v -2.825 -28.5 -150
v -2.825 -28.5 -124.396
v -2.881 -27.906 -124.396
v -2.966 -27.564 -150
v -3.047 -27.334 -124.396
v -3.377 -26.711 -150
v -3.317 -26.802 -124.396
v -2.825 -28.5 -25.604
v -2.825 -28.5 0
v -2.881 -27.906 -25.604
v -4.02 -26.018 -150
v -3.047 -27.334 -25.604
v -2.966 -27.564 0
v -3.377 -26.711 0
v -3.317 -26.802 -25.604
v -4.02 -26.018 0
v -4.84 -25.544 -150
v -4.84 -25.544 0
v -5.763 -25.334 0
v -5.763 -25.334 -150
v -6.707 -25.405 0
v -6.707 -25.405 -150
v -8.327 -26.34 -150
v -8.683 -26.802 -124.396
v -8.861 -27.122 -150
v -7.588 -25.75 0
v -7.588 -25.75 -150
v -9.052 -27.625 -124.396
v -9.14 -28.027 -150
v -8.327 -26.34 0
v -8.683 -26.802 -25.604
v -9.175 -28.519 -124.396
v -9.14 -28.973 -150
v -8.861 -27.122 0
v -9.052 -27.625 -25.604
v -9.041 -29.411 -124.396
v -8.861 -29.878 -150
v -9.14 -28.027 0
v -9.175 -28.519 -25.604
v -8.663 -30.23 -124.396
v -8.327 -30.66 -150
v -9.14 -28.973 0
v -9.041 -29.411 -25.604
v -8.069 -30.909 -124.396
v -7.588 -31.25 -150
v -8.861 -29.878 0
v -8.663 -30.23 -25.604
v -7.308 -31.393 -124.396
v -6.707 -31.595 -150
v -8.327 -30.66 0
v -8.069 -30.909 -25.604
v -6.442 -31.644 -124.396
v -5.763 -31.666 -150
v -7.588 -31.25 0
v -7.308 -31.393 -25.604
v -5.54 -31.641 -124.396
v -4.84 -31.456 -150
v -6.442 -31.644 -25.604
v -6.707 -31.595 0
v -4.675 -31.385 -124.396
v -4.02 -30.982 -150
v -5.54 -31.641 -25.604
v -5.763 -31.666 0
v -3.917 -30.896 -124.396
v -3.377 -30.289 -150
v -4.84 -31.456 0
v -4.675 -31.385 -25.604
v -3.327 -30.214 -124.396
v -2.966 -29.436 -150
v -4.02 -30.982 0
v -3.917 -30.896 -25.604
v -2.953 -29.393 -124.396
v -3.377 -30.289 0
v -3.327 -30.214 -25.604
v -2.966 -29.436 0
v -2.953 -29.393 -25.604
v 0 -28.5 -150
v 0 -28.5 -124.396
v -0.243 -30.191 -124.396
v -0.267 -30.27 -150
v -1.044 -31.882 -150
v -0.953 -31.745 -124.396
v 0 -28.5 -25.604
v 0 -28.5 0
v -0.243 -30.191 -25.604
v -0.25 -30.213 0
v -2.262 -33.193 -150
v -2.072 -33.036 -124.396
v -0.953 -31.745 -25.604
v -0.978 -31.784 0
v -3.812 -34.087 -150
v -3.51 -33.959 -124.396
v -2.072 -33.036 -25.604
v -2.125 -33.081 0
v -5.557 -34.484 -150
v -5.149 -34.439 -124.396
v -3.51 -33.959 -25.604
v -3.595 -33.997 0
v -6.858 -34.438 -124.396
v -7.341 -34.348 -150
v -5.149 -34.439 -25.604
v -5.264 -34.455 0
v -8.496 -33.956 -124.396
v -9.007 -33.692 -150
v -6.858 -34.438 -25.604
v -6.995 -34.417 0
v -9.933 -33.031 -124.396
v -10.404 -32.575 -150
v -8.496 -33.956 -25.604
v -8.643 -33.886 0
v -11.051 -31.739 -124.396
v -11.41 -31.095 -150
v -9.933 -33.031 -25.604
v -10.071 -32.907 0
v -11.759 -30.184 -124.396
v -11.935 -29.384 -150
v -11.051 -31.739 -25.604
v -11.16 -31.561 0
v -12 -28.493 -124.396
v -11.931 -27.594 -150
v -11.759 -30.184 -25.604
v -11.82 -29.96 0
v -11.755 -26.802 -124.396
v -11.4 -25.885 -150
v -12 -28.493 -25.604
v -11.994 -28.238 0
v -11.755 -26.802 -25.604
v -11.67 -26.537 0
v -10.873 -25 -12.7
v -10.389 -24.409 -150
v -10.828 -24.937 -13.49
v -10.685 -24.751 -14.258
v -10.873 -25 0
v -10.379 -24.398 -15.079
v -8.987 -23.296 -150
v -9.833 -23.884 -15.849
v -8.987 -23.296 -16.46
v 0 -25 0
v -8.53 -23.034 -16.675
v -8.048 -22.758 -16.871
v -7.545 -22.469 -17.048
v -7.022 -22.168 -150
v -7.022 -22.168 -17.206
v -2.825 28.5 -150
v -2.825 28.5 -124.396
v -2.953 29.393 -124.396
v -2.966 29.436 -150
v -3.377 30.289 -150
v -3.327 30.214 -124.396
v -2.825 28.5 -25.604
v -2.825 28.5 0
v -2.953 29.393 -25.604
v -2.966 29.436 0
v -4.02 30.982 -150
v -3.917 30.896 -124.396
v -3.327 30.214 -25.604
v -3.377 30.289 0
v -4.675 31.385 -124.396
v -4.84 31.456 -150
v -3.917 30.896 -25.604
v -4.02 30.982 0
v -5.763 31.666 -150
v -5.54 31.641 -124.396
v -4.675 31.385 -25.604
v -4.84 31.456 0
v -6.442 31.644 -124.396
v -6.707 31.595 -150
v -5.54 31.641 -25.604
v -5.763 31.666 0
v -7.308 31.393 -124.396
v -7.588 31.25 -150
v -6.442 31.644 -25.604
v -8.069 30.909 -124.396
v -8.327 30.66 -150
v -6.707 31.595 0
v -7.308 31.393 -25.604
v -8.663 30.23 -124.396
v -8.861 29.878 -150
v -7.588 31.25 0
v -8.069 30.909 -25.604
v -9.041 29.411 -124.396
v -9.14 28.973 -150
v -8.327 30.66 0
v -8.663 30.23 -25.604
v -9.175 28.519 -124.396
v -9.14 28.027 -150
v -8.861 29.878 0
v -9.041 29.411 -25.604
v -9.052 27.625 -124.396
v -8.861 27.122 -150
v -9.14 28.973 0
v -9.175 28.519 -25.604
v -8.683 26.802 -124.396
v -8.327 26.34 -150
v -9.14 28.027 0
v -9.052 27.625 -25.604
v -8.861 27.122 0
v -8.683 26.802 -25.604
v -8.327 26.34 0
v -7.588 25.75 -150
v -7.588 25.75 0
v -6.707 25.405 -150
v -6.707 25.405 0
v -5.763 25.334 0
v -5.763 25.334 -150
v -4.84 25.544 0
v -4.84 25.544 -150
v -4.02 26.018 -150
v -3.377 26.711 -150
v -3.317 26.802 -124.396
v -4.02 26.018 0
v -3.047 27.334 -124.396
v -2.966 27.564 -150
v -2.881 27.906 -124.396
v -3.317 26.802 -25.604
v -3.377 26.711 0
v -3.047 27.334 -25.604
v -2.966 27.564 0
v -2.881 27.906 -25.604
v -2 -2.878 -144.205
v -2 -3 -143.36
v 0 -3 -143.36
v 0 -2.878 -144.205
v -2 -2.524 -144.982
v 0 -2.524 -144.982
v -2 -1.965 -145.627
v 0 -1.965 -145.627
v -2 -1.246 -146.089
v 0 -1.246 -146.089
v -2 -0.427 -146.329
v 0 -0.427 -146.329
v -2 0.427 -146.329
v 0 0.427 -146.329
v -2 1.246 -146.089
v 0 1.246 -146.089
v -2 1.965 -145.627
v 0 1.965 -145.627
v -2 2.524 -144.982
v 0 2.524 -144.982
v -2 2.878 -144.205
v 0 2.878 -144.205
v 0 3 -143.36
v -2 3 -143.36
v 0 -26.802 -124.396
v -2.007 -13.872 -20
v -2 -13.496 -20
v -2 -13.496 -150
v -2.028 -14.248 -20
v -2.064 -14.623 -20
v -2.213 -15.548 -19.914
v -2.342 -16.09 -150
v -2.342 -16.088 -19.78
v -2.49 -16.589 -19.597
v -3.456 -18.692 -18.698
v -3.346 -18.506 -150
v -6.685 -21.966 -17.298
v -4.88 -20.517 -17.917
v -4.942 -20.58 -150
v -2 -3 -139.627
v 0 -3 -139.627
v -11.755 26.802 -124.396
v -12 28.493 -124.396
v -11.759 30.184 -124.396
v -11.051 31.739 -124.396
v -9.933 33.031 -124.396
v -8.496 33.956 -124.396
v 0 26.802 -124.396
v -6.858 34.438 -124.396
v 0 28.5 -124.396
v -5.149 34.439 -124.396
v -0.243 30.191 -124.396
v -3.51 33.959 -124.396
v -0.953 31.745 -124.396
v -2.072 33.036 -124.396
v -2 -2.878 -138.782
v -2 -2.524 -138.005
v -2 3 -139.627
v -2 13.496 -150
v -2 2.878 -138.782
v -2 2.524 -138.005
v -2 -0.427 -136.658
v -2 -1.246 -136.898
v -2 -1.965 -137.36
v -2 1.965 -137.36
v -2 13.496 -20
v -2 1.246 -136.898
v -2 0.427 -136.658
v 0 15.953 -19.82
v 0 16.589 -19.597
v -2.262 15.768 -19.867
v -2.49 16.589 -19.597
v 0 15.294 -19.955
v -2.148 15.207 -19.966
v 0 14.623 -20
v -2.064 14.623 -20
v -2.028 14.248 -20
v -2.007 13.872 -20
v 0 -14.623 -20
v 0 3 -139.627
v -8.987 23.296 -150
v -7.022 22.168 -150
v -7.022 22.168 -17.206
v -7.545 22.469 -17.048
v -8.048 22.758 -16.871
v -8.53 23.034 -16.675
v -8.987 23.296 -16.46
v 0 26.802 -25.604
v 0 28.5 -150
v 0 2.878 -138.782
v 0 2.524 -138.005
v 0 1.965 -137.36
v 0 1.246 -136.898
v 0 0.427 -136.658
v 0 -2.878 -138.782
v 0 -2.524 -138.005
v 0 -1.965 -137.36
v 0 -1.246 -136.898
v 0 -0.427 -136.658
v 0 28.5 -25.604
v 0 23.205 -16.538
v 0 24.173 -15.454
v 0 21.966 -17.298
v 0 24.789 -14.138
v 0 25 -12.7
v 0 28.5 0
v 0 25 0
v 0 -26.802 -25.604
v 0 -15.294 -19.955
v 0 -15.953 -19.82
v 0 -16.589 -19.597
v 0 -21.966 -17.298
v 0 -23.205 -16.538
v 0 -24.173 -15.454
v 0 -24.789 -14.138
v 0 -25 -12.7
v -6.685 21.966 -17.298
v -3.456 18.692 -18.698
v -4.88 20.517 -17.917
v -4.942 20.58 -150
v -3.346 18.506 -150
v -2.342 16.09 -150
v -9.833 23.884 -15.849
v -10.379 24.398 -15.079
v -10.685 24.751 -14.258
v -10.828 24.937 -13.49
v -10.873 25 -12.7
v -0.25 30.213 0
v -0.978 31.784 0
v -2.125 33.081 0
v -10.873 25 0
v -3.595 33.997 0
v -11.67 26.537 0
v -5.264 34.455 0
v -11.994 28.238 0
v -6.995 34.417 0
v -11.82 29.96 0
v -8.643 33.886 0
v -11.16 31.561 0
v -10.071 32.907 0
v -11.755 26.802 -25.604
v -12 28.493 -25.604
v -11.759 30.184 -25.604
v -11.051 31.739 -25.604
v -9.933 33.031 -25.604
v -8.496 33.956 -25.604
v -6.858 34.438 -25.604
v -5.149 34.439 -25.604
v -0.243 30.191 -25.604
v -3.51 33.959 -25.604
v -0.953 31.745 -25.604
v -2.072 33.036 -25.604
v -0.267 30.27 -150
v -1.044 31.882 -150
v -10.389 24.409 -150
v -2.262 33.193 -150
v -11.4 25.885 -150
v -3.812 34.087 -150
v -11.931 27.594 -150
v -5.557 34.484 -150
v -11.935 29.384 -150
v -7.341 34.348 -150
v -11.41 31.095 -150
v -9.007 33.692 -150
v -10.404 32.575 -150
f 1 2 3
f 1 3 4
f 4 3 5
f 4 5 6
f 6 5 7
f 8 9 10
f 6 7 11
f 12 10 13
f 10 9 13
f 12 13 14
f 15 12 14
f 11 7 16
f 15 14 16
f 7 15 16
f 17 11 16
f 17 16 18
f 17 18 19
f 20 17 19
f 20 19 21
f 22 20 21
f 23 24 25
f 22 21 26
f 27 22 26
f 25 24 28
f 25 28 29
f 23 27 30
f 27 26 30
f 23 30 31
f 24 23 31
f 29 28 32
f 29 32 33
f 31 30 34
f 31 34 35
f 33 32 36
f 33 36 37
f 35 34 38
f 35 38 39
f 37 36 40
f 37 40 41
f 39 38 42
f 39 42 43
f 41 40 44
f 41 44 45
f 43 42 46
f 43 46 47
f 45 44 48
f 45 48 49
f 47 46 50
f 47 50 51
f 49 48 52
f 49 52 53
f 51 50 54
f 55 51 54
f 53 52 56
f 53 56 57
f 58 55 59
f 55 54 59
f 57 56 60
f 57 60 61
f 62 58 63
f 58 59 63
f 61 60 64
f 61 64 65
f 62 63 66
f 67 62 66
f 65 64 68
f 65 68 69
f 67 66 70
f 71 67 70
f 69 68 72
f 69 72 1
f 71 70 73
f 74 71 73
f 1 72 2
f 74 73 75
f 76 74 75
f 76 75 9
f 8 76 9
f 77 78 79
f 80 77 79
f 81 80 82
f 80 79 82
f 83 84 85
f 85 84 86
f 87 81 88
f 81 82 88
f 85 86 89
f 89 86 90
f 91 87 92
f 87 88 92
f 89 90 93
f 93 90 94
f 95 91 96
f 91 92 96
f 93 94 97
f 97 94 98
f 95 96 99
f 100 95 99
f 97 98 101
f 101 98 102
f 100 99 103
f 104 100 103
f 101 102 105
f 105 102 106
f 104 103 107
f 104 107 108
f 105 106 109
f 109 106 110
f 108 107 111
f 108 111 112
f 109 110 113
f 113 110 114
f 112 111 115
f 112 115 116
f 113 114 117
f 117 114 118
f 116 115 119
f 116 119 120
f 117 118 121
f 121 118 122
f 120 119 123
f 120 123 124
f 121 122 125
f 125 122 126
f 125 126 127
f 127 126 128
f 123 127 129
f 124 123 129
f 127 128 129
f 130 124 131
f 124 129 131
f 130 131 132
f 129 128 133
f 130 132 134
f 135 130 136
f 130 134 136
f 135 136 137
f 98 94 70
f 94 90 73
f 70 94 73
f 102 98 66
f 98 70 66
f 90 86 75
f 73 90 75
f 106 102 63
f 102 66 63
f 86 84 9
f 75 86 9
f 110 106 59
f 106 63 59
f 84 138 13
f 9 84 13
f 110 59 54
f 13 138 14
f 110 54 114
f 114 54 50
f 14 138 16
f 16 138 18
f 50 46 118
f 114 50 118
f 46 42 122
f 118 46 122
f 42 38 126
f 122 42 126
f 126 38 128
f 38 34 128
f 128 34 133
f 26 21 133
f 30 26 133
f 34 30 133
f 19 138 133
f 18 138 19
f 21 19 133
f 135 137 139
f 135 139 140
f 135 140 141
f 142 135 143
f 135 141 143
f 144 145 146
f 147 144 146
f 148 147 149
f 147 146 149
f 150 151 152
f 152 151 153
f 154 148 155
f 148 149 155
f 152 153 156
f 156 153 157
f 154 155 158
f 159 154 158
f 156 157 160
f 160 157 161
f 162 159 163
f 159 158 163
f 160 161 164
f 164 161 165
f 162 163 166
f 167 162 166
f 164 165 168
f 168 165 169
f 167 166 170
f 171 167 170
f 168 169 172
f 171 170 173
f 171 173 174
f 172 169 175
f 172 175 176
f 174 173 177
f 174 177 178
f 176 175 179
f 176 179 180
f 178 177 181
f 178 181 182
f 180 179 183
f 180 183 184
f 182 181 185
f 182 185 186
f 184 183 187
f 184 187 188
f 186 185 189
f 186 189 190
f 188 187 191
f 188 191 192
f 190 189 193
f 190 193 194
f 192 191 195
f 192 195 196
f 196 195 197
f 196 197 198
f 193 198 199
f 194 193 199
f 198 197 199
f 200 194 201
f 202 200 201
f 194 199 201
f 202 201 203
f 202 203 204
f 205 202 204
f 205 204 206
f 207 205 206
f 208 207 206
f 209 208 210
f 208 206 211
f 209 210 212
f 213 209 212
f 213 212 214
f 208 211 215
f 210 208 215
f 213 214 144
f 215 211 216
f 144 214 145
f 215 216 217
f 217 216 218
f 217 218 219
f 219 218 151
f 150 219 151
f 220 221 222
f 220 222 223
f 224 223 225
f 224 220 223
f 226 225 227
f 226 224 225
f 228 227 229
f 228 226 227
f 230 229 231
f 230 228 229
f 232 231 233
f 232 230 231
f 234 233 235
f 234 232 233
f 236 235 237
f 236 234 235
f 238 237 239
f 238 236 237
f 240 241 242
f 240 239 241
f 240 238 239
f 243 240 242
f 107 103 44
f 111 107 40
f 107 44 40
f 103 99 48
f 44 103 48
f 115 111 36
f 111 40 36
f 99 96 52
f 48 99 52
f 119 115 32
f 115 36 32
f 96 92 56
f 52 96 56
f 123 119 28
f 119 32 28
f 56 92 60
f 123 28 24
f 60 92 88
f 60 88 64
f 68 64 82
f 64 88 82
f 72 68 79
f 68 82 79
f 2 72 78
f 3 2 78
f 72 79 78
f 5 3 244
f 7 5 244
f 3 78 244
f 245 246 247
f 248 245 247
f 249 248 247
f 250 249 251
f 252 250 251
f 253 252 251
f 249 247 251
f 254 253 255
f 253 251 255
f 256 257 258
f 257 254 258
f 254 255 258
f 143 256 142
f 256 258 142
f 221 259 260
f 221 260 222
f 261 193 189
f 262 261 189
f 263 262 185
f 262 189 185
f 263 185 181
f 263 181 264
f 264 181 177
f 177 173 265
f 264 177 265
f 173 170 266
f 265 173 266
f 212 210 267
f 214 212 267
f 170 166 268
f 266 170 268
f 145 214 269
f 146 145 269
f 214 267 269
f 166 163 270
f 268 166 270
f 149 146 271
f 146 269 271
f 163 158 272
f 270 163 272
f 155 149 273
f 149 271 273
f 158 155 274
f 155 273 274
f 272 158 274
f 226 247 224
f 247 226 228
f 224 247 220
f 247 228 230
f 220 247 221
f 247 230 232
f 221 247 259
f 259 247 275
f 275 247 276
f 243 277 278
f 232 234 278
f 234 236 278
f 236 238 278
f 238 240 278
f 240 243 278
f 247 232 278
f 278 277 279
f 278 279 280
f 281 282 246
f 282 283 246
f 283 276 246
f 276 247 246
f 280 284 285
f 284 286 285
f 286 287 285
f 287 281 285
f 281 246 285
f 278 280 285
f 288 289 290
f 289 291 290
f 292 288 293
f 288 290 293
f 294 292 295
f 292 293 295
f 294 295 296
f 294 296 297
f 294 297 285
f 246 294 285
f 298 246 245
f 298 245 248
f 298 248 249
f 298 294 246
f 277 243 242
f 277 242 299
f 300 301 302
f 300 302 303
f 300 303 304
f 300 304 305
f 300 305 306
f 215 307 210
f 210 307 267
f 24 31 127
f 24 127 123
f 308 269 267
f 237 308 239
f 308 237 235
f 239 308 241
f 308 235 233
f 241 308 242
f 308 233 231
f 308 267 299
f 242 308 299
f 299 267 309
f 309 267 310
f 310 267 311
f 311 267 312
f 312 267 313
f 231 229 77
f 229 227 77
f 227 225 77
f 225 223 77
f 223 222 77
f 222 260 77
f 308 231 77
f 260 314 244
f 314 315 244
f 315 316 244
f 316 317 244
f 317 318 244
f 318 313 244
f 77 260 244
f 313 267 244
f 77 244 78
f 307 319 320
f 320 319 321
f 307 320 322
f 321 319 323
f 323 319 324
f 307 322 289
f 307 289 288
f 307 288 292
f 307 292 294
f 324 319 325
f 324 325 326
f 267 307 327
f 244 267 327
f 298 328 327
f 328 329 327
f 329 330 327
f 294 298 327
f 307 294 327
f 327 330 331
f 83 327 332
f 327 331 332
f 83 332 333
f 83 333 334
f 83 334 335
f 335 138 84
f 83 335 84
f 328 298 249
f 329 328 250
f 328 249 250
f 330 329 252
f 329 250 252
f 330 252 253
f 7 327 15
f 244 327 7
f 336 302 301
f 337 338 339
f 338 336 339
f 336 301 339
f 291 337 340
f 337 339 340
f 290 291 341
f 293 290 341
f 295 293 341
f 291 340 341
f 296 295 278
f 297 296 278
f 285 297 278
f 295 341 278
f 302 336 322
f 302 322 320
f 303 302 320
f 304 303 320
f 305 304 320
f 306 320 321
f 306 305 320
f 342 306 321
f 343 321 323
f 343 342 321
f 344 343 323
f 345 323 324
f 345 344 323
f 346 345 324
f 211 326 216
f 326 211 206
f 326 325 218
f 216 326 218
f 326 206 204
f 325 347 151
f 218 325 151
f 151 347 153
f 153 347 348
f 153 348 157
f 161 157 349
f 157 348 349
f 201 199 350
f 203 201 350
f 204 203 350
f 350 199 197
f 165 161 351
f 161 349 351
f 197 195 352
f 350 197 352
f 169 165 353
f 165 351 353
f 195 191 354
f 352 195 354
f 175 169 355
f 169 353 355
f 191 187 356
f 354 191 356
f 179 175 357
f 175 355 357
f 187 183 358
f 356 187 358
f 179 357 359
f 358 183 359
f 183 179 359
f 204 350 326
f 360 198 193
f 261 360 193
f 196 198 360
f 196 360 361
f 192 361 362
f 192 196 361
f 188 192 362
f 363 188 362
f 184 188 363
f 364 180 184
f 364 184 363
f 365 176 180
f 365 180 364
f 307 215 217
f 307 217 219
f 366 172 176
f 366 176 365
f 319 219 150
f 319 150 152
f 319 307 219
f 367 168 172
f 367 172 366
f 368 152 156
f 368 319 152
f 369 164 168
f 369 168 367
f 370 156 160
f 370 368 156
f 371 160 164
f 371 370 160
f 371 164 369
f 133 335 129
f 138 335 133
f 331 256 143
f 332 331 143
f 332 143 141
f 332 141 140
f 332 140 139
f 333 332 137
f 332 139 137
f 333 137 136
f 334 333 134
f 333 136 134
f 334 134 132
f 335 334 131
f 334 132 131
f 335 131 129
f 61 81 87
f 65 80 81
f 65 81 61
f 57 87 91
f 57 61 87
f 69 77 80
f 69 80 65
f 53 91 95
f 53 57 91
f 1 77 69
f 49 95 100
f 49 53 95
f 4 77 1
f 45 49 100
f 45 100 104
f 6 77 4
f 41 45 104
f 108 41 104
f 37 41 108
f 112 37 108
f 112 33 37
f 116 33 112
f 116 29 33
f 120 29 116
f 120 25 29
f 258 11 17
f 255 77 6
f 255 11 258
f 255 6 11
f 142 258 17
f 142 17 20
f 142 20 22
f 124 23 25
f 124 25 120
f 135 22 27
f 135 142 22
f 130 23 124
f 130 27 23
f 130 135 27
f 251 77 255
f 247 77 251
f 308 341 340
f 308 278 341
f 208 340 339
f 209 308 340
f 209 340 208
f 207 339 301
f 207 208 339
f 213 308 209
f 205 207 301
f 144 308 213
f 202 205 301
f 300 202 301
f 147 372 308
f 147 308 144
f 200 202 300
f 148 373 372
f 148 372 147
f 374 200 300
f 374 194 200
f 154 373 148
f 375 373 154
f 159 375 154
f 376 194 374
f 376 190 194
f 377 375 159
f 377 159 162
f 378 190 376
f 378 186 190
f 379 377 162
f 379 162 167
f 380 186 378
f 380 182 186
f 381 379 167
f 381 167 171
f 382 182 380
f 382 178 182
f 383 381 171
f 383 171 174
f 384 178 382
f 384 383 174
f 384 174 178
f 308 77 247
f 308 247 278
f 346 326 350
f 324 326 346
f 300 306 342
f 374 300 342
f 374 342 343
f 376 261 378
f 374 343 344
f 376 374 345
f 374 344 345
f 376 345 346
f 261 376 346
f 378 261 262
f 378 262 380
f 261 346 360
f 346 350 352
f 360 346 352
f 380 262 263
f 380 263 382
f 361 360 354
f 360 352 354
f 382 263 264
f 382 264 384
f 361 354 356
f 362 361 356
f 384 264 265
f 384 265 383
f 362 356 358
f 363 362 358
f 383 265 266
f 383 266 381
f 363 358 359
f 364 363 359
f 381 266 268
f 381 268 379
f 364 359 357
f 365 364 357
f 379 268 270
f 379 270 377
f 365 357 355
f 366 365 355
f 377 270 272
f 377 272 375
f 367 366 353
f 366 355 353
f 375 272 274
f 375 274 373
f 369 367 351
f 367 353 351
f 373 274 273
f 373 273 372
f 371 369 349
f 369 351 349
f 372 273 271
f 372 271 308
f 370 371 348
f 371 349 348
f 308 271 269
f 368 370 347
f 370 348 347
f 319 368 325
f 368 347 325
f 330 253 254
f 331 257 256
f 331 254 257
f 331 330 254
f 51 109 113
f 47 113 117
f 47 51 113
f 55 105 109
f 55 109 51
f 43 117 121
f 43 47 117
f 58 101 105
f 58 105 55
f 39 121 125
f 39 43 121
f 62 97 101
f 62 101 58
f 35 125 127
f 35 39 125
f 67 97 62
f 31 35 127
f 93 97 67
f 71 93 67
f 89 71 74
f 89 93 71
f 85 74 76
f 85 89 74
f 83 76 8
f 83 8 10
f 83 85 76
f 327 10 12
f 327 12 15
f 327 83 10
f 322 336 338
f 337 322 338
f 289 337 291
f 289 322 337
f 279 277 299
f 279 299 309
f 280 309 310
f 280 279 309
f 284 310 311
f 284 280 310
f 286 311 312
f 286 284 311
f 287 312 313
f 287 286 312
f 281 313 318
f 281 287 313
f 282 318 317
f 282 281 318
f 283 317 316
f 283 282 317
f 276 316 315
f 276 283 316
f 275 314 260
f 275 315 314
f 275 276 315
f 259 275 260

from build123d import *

# Parameters (mm, degrees)
CROQUIS1_R              = 3.175
SALIENTE_EXTRUIR1_DEPTH = 150
REDONDEO1_R             = 10
CORTAR_EXTRUIR1_DEPTH   = 13
REDONDEO2_R             = 5
CROQUIS3_W              = 98.791812306
CROQUIS3_H              = 18.145434914
CORTAR_EXTRUIR2_DEPTH   = 13.0000001
CORTAR_EXTRUIR3_DEPTH   = 3.0000001


with BuildPart() as part:
    # Croquis1 → Saliente-Extruir1 (new body)
    with BuildSketch(Plane.XY):
        with BuildLine():
            Line((-2, 19.285827964), (-8.98691391, 23.296314259))
            ThreePointArc((-8.98691391, 23.296314259), (-9.006535925, 33.69237342), (0, 28.5))
            Line((0, 28.5), (0, -28.5))
            ThreePointArc((0, -28.5), (-9.006535925, -33.69237342), (-8.98691391, -23.296314259))
            Line((-8.98691391, -23.296314259), (-2, -19.285827964))
            Line((-2, -19.285827964), (-2, 19.285827964))
        make_face()
        with Locations((-6, 28.5)):
            Circle(CROQUIS1_R, mode=Mode.SUBTRACT)
        with Locations((-6, -28.5)):
            Circle(CROQUIS1_R, mode=Mode.SUBTRACT)
    extrude(amount=-SALIENTE_EXTRUIR1_DEPTH)

    # Redondeo1
    redondeo1_edges = [part.edges().sort_by_distance(p)[0] for p in [
        (-2, -19.285827964, -75),
        (-2, 19.285827964, -75),
    ]]
    fillet(redondeo1_edges, radius=REDONDEO1_R)

    # Croquis2 → Cortar-Extruir1 (cut, through all)
    with BuildSketch(Plane(origin=(0, 0, 0), x_dir=(0, 0, -1), z_dir=(1, 0, 0))):
        Polygon((16, 25), (20, 15.646846929), (20, -15.646846929), (16, -25), (-29.873538988, -25), (-29.873538988, 25), align=None)
    extrude(amount=-CORTAR_EXTRUIR1_DEPTH, mode=Mode.SUBTRACT)

    # Redondeo2
    redondeo2_edges = [part.edges().sort_by_distance(p)[0] for p in [
        (-1.117074127, 15.646846929, -20),
        (-1.117074127, -15.646846929, -20),
        (-5.436698586, -25, -16),
        (-5.436698586, 25, -16),
    ]]
    fillet(redondeo2_edges, radius=REDONDEO2_R)

    # Croquis3 → Cortar-Extruir2 (cut, through all)
    with BuildSketch(Plane(origin=(0, 0, 0), x_dir=(0, 0, -1), z_dir=(1, 0, 0))):
        with Locations((75, 35.875128035)):
            Rectangle(CROQUIS3_W, CROQUIS3_H)
        with Locations((75, -35.875128035)):
            Rectangle(CROQUIS3_W, CROQUIS3_H)
    extrude(amount=-CORTAR_EXTRUIR2_DEPTH, mode=Mode.SUBTRACT)

    # Croquis4 → Cortar-Extruir3 (cut, through all)
    with BuildSketch(Plane.ZY.offset(2)):
        with BuildLine():
            Line((-143.359821197, 3), (-139.627206237, 3))
            ThreePointArc((-139.627206237, 3), (-136.627206237, 0), (-139.627206237, -3))
            Line((-139.627206237, -3), (-143.359821197, -3))
            ThreePointArc((-143.359821197, -3), (-146.359821197, 0), (-143.359821197, 3))
        make_face()
    extrude(amount=-CORTAR_EXTRUIR3_DEPTH, mode=Mode.SUBTRACT)


solid = part.part
